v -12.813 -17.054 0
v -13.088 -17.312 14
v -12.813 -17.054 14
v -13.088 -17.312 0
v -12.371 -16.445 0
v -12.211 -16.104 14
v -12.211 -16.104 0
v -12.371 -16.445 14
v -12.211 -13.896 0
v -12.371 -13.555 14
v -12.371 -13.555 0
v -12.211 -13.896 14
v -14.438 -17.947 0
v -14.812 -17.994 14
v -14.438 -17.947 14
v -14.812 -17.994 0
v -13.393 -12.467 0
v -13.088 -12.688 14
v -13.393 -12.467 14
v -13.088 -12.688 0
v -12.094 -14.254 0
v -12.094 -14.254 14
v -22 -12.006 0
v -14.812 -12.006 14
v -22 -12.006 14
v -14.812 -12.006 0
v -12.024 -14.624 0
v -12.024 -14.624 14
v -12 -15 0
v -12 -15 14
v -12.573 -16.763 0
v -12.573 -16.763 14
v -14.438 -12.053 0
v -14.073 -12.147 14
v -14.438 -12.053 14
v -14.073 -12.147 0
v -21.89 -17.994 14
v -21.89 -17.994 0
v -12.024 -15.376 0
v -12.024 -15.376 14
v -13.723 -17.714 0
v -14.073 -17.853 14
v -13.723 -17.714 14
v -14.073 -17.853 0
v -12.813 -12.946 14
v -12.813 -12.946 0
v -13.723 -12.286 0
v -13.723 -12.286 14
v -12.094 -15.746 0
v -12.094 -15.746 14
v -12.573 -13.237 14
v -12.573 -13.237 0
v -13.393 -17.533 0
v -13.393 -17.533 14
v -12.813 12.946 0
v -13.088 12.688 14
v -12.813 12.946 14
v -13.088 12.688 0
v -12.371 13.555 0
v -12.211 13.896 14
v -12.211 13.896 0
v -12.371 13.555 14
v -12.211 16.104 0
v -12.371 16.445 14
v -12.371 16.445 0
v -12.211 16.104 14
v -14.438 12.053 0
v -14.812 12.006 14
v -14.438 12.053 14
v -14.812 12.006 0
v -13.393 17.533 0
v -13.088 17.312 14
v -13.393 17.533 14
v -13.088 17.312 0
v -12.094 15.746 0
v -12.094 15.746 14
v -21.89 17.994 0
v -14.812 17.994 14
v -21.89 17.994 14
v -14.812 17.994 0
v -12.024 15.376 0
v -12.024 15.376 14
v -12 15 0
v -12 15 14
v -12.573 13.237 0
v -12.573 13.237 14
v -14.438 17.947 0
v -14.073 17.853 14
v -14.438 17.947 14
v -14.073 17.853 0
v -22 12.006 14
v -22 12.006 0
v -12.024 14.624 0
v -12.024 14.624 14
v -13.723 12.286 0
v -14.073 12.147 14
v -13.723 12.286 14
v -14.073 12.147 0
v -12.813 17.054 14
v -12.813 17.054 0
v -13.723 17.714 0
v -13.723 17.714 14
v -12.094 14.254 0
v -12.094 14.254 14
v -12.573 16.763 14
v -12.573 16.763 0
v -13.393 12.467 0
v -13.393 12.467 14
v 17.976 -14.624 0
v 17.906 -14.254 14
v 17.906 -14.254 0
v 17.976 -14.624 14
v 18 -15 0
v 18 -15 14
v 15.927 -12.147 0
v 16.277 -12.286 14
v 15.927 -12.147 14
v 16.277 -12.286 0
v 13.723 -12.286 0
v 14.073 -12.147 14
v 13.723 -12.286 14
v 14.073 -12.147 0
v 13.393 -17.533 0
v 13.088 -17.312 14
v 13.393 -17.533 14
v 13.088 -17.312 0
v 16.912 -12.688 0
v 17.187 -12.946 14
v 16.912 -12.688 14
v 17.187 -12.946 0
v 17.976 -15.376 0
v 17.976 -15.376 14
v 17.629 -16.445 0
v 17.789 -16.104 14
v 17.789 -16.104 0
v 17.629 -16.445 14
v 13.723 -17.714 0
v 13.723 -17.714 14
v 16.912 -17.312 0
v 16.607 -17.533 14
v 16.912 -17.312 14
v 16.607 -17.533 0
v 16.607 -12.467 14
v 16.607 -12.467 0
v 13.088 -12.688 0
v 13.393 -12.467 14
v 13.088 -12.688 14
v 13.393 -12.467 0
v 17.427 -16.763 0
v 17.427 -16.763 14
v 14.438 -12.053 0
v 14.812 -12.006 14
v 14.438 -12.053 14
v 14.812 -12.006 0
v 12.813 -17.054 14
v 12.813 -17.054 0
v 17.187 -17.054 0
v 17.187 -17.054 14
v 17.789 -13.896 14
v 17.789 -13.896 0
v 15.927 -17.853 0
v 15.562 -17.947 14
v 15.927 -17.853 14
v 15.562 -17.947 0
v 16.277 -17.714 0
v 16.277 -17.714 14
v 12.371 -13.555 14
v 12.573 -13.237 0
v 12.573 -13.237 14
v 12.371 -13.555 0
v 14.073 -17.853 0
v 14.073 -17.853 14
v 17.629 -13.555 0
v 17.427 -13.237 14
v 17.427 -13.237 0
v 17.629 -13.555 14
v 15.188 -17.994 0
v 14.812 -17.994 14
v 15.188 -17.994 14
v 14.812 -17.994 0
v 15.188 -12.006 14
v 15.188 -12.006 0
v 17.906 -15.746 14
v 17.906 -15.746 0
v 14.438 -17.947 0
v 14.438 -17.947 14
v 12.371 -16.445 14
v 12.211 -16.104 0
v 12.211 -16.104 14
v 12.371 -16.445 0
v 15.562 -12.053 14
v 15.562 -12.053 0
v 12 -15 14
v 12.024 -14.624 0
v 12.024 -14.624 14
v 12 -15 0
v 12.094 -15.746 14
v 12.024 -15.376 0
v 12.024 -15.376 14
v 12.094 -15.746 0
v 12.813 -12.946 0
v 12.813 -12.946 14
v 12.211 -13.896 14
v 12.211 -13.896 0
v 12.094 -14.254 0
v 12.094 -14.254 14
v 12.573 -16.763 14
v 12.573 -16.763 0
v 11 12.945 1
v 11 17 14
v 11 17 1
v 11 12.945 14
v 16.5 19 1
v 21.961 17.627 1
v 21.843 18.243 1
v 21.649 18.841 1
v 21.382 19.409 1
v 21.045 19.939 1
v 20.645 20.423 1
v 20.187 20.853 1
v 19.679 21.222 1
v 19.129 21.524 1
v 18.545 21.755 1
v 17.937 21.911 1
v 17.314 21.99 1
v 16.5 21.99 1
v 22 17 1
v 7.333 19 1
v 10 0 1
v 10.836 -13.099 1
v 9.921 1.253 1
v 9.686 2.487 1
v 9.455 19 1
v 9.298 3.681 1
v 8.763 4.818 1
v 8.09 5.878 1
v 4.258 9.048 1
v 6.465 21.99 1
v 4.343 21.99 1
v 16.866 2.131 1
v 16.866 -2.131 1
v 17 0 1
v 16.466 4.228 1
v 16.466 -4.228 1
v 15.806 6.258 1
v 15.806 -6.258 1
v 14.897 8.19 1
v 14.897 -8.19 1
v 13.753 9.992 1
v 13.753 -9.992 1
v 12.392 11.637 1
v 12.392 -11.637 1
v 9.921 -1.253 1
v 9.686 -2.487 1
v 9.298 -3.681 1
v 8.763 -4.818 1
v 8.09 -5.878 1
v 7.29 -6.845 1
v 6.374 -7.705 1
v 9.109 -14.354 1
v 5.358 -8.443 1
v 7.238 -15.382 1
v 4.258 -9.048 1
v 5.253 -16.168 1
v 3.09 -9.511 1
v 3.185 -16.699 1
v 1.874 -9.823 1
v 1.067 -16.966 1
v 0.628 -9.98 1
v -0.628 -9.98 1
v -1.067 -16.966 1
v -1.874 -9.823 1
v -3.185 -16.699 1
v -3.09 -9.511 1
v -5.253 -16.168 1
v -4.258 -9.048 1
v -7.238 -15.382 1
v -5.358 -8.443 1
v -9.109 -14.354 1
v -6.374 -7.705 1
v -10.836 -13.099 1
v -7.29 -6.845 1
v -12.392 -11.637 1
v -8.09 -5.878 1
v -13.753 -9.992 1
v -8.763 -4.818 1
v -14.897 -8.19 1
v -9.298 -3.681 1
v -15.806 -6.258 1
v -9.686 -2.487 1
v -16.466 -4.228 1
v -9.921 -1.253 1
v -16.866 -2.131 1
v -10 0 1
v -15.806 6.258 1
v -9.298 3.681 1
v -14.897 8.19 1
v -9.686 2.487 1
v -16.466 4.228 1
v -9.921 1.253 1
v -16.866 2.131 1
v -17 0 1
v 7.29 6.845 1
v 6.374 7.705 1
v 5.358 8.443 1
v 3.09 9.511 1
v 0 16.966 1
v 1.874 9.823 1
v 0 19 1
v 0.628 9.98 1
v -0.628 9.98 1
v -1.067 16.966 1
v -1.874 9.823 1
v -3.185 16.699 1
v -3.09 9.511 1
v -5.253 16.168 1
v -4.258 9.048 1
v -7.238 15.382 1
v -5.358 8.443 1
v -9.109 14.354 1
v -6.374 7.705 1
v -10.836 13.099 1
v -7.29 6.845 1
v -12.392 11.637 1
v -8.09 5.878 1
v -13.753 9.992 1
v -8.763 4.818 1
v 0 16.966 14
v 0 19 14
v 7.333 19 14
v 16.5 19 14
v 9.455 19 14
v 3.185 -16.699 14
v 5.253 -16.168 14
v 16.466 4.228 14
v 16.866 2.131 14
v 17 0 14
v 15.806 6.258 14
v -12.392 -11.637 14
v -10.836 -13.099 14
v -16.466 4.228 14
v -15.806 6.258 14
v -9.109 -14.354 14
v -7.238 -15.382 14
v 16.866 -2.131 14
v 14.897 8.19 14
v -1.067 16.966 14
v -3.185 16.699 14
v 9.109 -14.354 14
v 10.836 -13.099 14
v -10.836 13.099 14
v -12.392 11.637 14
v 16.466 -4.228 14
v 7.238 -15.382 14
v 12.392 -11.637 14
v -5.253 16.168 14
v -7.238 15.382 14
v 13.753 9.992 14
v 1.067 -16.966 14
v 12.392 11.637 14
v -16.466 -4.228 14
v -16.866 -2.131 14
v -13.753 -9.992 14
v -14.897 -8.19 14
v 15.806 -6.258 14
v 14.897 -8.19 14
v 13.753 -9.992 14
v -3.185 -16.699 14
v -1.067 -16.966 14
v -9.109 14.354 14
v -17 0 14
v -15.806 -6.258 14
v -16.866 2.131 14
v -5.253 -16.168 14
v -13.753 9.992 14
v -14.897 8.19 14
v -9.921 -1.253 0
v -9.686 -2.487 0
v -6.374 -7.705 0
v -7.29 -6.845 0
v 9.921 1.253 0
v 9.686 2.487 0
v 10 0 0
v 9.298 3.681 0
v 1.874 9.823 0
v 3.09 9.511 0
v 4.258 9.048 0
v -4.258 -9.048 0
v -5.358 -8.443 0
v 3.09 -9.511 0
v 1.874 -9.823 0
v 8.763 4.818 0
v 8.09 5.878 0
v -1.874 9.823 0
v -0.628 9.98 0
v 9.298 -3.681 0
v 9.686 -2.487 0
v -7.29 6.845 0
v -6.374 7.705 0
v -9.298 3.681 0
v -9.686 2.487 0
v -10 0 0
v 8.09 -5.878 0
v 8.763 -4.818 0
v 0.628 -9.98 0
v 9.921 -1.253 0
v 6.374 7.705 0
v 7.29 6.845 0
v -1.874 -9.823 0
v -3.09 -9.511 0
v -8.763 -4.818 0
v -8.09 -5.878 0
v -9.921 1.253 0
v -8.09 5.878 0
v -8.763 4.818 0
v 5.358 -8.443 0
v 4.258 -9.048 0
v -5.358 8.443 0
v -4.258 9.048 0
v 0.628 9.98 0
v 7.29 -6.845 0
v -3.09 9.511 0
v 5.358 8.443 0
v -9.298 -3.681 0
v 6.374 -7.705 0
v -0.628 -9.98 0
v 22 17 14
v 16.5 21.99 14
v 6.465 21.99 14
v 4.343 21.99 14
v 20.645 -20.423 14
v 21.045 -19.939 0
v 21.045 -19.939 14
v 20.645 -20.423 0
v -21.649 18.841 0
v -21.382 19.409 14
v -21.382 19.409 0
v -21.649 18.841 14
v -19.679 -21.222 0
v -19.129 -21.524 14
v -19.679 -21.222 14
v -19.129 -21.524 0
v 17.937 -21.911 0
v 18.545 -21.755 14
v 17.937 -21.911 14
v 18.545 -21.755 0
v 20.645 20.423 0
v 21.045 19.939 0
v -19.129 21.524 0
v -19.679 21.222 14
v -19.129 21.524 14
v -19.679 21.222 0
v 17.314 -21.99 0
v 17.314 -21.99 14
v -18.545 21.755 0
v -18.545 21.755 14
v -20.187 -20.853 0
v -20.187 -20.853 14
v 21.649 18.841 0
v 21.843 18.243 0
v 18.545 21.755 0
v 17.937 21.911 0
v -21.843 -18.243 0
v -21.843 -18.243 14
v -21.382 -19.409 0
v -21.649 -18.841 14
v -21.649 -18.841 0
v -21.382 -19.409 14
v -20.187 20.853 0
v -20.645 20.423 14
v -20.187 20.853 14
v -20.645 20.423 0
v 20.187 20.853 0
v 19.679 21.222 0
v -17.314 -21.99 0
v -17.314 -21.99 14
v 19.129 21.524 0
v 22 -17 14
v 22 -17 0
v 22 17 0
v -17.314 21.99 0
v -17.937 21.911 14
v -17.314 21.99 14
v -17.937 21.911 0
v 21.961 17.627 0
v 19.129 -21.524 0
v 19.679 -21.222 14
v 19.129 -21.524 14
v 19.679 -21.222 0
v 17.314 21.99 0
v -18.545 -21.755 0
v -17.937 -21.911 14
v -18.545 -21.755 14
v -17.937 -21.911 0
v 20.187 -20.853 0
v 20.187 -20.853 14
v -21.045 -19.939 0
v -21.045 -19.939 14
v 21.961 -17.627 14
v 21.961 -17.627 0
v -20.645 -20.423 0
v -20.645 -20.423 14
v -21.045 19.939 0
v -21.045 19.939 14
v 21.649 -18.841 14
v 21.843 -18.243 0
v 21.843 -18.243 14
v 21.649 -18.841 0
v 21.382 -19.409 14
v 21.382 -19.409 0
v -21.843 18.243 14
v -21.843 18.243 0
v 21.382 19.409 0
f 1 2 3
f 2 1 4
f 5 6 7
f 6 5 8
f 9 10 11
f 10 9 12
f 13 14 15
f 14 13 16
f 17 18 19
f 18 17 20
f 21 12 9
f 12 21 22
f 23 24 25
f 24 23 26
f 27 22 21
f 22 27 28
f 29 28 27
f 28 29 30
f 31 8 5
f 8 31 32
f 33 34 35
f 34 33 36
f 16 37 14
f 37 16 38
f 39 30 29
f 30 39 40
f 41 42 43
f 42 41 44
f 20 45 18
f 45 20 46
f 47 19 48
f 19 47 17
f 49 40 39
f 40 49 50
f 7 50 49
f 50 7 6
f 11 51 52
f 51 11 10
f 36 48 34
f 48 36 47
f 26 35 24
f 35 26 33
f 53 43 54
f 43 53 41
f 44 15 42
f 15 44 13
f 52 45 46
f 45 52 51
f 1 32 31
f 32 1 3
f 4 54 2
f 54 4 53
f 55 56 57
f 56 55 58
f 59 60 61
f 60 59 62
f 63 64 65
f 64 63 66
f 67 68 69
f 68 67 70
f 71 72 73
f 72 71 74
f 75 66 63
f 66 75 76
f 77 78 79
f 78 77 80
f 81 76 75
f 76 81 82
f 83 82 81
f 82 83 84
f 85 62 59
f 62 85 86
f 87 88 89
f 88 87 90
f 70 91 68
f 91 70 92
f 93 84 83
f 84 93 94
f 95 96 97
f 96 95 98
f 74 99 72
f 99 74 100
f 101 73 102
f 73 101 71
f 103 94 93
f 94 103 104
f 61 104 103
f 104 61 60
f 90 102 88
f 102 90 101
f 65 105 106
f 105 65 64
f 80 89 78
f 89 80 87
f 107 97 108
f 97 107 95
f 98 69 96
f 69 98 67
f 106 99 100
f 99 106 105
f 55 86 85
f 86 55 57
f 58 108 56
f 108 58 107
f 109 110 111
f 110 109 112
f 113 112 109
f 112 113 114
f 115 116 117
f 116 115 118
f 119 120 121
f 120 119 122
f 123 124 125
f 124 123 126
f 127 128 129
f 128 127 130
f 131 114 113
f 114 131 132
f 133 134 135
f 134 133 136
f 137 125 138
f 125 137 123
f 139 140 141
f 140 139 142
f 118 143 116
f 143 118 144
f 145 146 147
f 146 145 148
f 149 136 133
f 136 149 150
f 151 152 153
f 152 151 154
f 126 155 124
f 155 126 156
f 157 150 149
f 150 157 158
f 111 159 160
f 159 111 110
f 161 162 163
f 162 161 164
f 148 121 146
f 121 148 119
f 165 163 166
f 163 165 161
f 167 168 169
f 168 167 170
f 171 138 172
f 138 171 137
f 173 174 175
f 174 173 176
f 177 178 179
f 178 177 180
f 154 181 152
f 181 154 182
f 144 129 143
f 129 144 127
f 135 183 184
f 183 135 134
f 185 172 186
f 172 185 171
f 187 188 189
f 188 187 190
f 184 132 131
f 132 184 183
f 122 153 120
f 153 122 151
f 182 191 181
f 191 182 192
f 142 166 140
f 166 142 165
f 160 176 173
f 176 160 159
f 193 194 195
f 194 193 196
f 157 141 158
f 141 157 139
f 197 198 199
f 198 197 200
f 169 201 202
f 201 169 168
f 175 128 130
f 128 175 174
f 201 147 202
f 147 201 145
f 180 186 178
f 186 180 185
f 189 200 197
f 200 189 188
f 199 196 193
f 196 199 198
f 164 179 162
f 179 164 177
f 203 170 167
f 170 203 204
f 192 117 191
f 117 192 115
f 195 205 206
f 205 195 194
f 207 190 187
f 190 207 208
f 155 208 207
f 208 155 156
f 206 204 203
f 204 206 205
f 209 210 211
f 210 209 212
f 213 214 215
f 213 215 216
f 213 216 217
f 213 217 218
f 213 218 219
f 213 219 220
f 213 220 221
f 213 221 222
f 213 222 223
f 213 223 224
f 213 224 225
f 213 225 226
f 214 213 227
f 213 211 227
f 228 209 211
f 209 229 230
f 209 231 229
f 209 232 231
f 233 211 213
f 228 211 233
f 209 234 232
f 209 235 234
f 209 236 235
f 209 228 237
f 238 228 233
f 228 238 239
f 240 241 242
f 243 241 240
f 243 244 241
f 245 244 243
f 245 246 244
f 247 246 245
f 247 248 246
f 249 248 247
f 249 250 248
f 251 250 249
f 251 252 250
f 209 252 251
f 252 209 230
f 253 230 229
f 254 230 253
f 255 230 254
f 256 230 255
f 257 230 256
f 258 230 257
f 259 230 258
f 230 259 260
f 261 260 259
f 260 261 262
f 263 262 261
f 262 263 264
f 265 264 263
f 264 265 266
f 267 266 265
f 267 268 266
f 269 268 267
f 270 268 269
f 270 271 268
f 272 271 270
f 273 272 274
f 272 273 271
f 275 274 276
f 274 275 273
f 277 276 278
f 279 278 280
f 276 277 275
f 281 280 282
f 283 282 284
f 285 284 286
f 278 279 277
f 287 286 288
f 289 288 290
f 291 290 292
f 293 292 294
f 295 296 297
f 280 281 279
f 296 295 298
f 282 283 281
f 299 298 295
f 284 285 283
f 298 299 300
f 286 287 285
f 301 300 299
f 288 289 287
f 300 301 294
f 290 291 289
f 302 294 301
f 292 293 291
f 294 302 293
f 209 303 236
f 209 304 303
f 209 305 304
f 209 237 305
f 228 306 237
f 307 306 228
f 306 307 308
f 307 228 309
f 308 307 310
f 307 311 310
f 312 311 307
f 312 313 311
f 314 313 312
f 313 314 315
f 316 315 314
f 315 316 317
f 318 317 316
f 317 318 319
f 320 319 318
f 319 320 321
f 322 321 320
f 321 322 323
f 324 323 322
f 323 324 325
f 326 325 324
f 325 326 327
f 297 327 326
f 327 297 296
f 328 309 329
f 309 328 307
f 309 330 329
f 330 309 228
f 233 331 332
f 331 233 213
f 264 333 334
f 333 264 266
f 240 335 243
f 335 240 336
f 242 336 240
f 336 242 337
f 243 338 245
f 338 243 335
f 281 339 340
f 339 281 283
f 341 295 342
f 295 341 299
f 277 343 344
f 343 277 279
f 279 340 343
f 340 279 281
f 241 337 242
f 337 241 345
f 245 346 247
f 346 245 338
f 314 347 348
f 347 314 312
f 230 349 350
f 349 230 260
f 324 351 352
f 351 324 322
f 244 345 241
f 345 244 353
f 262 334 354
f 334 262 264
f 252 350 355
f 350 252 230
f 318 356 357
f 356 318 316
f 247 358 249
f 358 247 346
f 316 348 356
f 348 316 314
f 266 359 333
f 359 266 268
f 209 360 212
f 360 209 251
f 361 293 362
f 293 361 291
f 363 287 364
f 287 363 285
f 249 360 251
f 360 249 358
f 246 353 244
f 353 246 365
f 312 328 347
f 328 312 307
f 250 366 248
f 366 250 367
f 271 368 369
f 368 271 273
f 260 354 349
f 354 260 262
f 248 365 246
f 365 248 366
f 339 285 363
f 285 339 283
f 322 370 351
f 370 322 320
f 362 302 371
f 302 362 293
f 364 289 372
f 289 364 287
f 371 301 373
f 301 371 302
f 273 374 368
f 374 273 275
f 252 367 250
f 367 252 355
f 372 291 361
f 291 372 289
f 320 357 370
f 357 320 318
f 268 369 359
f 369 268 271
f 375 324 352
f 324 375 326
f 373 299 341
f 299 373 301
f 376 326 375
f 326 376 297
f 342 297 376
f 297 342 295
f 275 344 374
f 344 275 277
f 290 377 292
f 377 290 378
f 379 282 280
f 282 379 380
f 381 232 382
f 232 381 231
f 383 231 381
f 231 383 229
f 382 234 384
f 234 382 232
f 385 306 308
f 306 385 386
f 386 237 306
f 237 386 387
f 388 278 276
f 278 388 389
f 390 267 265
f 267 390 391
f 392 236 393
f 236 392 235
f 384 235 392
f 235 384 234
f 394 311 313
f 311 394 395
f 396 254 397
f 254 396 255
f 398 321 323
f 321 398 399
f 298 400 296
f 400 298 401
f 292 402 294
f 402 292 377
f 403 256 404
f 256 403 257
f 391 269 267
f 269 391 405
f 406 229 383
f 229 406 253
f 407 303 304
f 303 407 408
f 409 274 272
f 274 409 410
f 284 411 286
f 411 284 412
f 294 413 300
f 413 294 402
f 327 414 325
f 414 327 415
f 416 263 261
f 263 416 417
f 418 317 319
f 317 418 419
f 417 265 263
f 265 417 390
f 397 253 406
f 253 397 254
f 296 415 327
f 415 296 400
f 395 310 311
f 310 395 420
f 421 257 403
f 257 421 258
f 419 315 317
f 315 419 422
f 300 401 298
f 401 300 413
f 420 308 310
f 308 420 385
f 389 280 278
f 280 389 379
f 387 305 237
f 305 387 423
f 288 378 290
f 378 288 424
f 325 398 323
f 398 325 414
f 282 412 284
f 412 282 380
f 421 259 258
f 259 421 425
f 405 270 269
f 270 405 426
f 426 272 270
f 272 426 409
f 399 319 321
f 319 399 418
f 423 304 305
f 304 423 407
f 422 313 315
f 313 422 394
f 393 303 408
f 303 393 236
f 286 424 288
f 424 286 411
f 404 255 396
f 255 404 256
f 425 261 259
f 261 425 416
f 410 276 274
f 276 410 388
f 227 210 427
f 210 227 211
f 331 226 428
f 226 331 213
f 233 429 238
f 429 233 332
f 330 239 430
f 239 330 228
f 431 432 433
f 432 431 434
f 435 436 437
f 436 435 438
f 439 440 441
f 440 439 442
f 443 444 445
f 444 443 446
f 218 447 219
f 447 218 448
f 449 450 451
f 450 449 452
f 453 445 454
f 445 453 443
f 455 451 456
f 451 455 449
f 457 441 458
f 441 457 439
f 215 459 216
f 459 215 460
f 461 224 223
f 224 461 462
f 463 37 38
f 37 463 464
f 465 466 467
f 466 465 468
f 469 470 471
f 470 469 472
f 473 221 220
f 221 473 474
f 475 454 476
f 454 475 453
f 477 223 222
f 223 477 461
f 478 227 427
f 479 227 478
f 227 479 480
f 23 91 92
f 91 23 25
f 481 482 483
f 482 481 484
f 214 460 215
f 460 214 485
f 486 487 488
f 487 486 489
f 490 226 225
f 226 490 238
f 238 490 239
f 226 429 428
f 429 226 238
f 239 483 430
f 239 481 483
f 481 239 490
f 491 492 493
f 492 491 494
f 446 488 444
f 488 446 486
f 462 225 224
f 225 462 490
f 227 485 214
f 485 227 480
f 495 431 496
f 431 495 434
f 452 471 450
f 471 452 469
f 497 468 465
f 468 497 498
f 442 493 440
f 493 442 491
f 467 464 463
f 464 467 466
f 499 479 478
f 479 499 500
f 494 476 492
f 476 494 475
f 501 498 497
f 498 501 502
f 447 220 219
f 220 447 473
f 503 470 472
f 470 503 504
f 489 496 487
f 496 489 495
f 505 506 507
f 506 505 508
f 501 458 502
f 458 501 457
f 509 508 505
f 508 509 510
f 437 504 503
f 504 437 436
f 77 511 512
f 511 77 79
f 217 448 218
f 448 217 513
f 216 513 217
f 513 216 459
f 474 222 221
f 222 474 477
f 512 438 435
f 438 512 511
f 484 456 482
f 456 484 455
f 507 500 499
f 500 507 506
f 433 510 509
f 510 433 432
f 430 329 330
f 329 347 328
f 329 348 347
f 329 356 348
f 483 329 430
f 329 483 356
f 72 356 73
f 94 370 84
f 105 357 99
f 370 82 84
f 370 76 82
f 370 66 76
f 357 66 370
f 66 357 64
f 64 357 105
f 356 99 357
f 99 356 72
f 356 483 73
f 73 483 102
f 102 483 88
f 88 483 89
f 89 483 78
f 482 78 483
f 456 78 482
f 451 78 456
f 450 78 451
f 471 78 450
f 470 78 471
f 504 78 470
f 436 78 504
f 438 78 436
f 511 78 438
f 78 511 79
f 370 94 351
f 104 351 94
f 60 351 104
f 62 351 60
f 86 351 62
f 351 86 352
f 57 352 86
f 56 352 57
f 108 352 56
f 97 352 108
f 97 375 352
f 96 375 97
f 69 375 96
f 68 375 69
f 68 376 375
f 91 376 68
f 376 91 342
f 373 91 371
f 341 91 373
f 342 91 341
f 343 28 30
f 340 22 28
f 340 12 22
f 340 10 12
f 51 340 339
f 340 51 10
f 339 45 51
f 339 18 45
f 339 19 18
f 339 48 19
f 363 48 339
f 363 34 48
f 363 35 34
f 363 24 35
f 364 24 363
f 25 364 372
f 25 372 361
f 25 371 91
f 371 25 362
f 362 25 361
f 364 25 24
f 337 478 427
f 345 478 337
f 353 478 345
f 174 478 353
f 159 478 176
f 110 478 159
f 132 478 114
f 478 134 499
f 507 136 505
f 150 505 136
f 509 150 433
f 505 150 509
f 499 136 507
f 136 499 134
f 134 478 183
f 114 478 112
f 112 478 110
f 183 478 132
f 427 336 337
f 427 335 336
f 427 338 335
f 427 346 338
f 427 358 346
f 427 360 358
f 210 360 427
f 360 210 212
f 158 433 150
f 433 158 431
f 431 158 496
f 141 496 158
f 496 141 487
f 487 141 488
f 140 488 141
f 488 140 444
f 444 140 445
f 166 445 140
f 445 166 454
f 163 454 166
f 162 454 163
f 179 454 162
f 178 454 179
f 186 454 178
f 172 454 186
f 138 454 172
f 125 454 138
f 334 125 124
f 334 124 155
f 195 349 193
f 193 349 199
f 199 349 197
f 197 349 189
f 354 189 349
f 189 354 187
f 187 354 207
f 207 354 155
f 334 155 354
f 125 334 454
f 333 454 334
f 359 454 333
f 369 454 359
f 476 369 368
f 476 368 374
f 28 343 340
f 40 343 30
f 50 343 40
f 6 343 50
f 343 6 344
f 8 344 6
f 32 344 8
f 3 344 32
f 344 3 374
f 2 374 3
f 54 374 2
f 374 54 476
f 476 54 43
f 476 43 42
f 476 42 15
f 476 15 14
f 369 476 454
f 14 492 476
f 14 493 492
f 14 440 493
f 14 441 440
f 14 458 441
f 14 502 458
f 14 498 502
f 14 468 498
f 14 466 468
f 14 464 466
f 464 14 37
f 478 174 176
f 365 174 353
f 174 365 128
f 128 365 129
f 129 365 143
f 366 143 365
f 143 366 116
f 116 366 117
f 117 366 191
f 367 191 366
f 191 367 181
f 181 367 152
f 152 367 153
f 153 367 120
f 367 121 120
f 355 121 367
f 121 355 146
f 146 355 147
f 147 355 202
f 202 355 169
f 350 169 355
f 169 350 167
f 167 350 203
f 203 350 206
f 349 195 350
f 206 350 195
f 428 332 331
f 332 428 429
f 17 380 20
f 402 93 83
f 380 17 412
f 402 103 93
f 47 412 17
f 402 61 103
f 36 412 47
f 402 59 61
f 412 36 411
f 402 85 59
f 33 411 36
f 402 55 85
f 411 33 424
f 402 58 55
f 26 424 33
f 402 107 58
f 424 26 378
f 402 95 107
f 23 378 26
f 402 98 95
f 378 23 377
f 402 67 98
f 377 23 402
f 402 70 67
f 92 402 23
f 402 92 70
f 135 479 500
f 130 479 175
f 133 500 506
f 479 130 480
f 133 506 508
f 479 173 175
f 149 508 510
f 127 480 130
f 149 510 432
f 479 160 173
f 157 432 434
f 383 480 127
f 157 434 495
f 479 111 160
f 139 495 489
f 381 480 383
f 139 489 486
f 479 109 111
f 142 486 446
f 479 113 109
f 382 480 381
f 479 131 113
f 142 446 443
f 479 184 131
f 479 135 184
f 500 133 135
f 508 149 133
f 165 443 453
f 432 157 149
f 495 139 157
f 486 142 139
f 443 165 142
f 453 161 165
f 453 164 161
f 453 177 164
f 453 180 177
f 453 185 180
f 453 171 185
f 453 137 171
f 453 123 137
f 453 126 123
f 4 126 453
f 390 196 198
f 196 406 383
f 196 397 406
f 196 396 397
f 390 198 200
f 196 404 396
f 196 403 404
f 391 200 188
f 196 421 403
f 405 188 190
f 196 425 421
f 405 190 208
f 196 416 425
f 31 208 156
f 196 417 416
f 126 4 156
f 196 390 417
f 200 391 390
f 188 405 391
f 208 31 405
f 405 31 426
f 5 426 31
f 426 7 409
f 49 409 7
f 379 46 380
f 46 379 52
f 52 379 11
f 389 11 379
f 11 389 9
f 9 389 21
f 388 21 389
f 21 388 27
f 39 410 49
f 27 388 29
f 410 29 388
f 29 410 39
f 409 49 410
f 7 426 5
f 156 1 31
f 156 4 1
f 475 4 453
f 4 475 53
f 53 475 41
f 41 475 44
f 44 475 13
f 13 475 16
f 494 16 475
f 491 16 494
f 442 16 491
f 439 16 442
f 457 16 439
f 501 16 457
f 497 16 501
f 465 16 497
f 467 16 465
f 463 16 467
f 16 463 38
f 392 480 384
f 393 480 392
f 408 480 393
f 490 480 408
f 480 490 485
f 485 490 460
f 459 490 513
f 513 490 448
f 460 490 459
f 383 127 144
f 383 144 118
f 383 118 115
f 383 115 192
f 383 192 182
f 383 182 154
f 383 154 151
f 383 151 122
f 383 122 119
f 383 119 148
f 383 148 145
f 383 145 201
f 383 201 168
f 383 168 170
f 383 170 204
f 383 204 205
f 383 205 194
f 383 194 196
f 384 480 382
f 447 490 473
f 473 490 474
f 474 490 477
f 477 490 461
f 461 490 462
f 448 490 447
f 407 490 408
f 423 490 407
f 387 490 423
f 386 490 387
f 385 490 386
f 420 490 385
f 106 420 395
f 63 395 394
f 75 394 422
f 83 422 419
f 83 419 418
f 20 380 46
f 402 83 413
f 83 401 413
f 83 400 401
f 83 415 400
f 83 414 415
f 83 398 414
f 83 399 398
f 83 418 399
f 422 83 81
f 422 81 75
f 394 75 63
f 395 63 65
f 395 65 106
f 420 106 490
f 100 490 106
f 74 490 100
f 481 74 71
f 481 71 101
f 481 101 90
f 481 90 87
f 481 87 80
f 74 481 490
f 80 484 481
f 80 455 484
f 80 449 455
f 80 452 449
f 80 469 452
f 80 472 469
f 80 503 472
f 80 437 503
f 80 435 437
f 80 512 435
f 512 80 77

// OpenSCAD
$fn = 50;


difference() {
	union() {
		translate(v = [0, 0, 0]) {
			rotate(a = [0, 0, 0]) {
				hull() {
					translate(v = [-17.0000000000, 17.0000000000, 0]) {
						rotate(a = [0, 0, 0]) {
							translate(v = [0, 0, 0]) {
								rotate(a = [0, 0, 0]) {
									cylinder(h = 14, r = 5);
								}
							}
						}
					}
					translate(v = [17.0000000000, 17.0000000000, 0]) {
						rotate(a = [0, 0, 0]) {
							translate(v = [0, 0, 0]) {
								rotate(a = [0, 0, 0]) {
									cylinder(h = 14, r = 5);
								}
							}
						}
					}
					translate(v = [-17.0000000000, -17.0000000000, 0]) {
						rotate(a = [0, 0, 0]) {
							translate(v = [0, 0, 0]) {
								rotate(a = [0, 0, 0]) {
									cylinder(h = 14, r = 5);
								}
							}
						}
					}
					translate(v = [17.0000000000, -17.0000000000, 0]) {
						rotate(a = [0, 0, 0]) {
							translate(v = [0, 0, 0]) {
								rotate(a = [0, 0, 0]) {
									cylinder(h = 14, r = 5);
								}
							}
						}
					}
				}
			}
		}
	}
	union() {
		translate(v = [-22.5000000000, -15.0000000000, -125]) {
			rotate(a = [0, 0, 0]) {
				hull() {
					translate(v = [7.5000000000, 0, 0]) {
						rotate(a = [0, 0, 0]) {
							translate(v = [0, 0, 0]) {
								rotate(a = [0, 0, 0]) {
									cylinder(h = 250, r = 3.0000000000);
								}
							}
						}
					}
					translate(v = [-7.5000000000, 0, 0]) {
						rotate(a = [0, 0, 0]) {
							translate(v = [0, 0, 0]) {
								rotate(a = [0, 0, 0]) {
									cylinder(h = 250, r = 3.0000000000);
								}
							}
						}
					}
				}
			}
		}
		translate(v = [-22.5000000000, 15.0000000000, -125]) {
			rotate(a = [0, 0, 0]) {
				hull() {
					translate(v = [7.5000000000, 0, 0]) {
						rotate(a = [0, 0, 0]) {
							translate(v = [0, 0, 0]) {
								rotate(a = [0, 0, 0]) {
									cylinder(h = 250, r = 3.0000000000);
								}
							}
						}
					}
					translate(v = [-7.5000000000, 0, 0]) {
						rotate(a = [0, 0, 0]) {
							translate(v = [0, 0, 0]) {
								rotate(a = [0, 0, 0]) {
									cylinder(h = 250, r = 3.0000000000);
								}
							}
						}
					}
				}
			}
		}
		translate(v = [15.0000000000, -15.0000000000, -125.0000000000]) {
			rotate(a = [0, 0, 0]) {
				cylinder(h = 250, r = 3.0000000000);
			}
		}
		translate(v = [0.0000000000, 11.0000000000, 1.0000000000]) {
			rotate(a = [0, 0, 0]) {
				cube(size = [11, 8, 16]);
			}
		}
		translate(v = [0, 0, 1.0000000000]) {
			rotate(a = [0, 0, 0]) {
				cylinder(h = 16, r = 17.0000000000);
			}
		}
		translate(v = [0, 0, -7.0000000000]) {
			rotate(a = [0, 0, 0]) {
				cylinder(h = 14, r = 10.0000000000);
			}
		}
		translate(v = [0.0000000000, 17.0000000000, 1]) {
			rotate(a = [0, 0, 0]) {
				cube(size = [22.0000000000, 2, 16]);
			}
		}
		translate(v = [16.5000000000, 17.0000000000, 1]) {
			rotate(a = [0, 0, 0]) {
				cube(size = [5.5000000000, 5, 16]);
			}
		}
		translate(v = [3.5833333333, 22.7500000000, 1]) {
			rotate(a = [0, 0, -45]) {
				cube(size = [7.5000000000, 1.5000000000, 16]);
			}
		}
	}
}
